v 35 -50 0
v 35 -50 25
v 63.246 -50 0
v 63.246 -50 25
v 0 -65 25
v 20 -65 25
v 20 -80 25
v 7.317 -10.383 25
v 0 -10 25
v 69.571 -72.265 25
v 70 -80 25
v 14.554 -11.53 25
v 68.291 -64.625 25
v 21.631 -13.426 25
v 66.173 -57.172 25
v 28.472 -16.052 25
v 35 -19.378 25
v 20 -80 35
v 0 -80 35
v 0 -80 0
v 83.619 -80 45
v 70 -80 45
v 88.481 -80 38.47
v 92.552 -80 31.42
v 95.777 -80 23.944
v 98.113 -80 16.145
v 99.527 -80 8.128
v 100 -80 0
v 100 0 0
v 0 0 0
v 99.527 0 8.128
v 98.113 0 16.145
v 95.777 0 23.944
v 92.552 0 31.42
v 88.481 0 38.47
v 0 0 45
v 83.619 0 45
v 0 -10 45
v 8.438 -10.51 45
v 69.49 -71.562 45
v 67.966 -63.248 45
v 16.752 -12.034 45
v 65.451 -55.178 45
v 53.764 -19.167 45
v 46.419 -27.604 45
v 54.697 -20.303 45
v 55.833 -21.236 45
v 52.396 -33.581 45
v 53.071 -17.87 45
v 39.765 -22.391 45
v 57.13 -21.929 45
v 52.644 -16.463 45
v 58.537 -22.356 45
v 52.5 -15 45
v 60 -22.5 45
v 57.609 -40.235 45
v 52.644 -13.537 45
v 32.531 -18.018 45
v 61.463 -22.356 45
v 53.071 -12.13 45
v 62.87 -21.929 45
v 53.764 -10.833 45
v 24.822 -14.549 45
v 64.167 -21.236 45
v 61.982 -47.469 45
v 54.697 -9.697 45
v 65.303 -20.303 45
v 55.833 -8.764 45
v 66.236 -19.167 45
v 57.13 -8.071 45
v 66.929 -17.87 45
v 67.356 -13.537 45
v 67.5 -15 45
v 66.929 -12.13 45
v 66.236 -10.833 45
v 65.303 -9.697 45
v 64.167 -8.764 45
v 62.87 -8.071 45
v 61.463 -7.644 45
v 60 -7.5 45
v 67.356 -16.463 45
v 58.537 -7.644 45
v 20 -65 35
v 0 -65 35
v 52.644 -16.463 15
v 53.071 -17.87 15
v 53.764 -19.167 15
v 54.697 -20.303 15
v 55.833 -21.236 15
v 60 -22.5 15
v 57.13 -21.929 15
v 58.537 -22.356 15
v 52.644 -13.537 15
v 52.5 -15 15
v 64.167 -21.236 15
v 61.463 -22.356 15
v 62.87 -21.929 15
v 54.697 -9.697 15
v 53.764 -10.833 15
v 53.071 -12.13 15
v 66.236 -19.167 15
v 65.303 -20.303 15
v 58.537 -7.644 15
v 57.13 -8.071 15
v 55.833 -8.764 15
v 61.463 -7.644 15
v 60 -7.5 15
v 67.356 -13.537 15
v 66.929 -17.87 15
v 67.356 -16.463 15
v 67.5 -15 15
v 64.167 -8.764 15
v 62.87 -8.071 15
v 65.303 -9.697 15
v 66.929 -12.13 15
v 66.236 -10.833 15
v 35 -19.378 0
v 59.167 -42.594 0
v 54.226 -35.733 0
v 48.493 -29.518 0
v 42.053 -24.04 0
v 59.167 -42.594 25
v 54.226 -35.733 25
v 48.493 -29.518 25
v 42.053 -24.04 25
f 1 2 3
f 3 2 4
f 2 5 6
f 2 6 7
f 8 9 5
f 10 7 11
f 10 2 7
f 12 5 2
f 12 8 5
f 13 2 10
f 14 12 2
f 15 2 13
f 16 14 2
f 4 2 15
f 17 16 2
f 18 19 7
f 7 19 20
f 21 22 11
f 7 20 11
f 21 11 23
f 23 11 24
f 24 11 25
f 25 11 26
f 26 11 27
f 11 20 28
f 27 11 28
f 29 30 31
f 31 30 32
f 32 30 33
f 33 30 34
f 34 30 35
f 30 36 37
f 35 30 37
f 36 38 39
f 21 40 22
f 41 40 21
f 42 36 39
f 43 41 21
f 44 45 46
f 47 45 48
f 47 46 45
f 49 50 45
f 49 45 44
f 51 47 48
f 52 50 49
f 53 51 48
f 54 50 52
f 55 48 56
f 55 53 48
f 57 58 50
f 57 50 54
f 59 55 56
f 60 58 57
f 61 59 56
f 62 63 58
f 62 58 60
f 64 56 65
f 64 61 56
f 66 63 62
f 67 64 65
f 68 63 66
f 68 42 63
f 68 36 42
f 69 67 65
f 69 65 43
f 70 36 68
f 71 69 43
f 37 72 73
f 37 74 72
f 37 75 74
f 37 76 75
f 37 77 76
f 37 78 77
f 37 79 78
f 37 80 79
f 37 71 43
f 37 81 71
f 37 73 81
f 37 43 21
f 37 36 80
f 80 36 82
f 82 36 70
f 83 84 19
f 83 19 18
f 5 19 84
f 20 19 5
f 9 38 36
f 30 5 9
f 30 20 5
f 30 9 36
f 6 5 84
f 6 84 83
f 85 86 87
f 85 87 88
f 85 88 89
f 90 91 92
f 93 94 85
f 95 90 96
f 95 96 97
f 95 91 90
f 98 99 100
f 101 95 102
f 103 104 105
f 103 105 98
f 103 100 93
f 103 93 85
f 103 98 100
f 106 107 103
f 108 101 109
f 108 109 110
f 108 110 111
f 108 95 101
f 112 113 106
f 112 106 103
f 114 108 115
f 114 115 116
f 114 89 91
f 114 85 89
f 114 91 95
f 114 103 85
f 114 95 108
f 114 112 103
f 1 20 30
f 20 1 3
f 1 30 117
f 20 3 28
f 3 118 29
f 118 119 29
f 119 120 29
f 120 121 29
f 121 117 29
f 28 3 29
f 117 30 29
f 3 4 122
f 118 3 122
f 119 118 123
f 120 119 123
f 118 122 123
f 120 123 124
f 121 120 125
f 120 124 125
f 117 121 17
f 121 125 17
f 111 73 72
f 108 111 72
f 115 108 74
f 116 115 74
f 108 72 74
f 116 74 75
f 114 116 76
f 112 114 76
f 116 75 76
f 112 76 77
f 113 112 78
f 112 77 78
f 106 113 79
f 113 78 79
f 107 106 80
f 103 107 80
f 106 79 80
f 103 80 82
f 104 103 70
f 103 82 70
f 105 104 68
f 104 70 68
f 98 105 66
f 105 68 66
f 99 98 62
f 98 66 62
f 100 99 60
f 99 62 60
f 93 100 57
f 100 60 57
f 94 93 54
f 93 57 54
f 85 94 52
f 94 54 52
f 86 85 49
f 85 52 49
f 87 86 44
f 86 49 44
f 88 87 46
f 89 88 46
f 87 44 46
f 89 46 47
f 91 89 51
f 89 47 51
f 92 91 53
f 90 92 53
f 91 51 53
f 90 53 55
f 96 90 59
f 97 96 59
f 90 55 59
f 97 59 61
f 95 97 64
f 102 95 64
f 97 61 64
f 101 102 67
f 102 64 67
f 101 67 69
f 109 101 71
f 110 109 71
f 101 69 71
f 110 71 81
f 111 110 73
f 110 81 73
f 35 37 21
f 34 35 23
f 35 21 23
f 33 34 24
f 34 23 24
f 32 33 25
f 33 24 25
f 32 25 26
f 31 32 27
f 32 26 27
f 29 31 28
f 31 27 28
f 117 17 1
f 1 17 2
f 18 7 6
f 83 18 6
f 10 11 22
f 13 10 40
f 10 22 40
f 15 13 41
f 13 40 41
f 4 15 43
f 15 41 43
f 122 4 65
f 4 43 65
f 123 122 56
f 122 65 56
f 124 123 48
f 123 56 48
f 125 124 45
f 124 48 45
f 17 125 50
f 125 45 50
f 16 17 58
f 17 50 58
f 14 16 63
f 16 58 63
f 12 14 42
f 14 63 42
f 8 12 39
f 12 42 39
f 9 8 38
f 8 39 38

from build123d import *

# Parameters (mm, degrees)
F0_W      = 100
F0_H      = 45
F1_DEPTH  = 80
F2_R      = 7.5
F3_DEPTH  = 30
F4_R      = 70
F5_DEPTH  = 20
F6_W      = 20
F6_H      = 15
F7_DEPTH  = 10
F10_DEPTH = 25.001
F12_DEPTH = 80.001


with BuildPart() as f1:
    # F0 (on Front) → F1 (new body)
    with BuildSketch(Plane.XZ):
        with Locations((50, 22.5)):
            Rectangle(F0_W, F0_H)
    extrude(amount=F1_DEPTH)

    # F2 (on face) → F3 (cut)
    with BuildSketch(Plane.XY.offset(45)):
        with Locations((60, -15)):
            Circle(F2_R)
    extrude(amount=-F3_DEPTH, mode=Mode.SUBTRACT)

    # F4 (on face) → F5 (cut)
    with BuildSketch(Plane.XY.offset(45)):
        with Locations((0, -80)):
            Circle(F4_R)
    extrude(amount=-F5_DEPTH, mode=Mode.SUBTRACT)

    # F6 (on face) → F7 (join)
    with BuildSketch(Plane.XY.offset(25)):
        with Locations((10, -72.5)):
            Rectangle(F6_W, F6_H)
    extrude(amount=F7_DEPTH)

    # F9 (on face) → F10 (cut, through all)
    with BuildSketch(Plane.XY.offset(25)):
        with BuildLine():
            ThreePointArc((63.2455532034, -50), (51.4535762322, -32.5391793906), (35, -19.3782217351))
            Line((35, -19.3782217351), (35, -50))
            Line((35, -50), (63.2455532034, -50))
        make_face()
    extrude(amount=-F10_DEPTH, mode=Mode.SUBTRACT)

    # F11 (on face) → F12 (cut, through all)
    with BuildSketch(Plane.XZ.offset(80)):
        with BuildLine():
            ThreePointArc((83.6190264738, 45), (95.7773967757, 23.944395449), (100, 0))
            Line((100, 0), (100, 45))
            Line((100, 45), (83.6190264738, 45))
        make_face()
    extrude(amount=-F12_DEPTH, mode=Mode.SUBTRACT)


solid = f1.part
